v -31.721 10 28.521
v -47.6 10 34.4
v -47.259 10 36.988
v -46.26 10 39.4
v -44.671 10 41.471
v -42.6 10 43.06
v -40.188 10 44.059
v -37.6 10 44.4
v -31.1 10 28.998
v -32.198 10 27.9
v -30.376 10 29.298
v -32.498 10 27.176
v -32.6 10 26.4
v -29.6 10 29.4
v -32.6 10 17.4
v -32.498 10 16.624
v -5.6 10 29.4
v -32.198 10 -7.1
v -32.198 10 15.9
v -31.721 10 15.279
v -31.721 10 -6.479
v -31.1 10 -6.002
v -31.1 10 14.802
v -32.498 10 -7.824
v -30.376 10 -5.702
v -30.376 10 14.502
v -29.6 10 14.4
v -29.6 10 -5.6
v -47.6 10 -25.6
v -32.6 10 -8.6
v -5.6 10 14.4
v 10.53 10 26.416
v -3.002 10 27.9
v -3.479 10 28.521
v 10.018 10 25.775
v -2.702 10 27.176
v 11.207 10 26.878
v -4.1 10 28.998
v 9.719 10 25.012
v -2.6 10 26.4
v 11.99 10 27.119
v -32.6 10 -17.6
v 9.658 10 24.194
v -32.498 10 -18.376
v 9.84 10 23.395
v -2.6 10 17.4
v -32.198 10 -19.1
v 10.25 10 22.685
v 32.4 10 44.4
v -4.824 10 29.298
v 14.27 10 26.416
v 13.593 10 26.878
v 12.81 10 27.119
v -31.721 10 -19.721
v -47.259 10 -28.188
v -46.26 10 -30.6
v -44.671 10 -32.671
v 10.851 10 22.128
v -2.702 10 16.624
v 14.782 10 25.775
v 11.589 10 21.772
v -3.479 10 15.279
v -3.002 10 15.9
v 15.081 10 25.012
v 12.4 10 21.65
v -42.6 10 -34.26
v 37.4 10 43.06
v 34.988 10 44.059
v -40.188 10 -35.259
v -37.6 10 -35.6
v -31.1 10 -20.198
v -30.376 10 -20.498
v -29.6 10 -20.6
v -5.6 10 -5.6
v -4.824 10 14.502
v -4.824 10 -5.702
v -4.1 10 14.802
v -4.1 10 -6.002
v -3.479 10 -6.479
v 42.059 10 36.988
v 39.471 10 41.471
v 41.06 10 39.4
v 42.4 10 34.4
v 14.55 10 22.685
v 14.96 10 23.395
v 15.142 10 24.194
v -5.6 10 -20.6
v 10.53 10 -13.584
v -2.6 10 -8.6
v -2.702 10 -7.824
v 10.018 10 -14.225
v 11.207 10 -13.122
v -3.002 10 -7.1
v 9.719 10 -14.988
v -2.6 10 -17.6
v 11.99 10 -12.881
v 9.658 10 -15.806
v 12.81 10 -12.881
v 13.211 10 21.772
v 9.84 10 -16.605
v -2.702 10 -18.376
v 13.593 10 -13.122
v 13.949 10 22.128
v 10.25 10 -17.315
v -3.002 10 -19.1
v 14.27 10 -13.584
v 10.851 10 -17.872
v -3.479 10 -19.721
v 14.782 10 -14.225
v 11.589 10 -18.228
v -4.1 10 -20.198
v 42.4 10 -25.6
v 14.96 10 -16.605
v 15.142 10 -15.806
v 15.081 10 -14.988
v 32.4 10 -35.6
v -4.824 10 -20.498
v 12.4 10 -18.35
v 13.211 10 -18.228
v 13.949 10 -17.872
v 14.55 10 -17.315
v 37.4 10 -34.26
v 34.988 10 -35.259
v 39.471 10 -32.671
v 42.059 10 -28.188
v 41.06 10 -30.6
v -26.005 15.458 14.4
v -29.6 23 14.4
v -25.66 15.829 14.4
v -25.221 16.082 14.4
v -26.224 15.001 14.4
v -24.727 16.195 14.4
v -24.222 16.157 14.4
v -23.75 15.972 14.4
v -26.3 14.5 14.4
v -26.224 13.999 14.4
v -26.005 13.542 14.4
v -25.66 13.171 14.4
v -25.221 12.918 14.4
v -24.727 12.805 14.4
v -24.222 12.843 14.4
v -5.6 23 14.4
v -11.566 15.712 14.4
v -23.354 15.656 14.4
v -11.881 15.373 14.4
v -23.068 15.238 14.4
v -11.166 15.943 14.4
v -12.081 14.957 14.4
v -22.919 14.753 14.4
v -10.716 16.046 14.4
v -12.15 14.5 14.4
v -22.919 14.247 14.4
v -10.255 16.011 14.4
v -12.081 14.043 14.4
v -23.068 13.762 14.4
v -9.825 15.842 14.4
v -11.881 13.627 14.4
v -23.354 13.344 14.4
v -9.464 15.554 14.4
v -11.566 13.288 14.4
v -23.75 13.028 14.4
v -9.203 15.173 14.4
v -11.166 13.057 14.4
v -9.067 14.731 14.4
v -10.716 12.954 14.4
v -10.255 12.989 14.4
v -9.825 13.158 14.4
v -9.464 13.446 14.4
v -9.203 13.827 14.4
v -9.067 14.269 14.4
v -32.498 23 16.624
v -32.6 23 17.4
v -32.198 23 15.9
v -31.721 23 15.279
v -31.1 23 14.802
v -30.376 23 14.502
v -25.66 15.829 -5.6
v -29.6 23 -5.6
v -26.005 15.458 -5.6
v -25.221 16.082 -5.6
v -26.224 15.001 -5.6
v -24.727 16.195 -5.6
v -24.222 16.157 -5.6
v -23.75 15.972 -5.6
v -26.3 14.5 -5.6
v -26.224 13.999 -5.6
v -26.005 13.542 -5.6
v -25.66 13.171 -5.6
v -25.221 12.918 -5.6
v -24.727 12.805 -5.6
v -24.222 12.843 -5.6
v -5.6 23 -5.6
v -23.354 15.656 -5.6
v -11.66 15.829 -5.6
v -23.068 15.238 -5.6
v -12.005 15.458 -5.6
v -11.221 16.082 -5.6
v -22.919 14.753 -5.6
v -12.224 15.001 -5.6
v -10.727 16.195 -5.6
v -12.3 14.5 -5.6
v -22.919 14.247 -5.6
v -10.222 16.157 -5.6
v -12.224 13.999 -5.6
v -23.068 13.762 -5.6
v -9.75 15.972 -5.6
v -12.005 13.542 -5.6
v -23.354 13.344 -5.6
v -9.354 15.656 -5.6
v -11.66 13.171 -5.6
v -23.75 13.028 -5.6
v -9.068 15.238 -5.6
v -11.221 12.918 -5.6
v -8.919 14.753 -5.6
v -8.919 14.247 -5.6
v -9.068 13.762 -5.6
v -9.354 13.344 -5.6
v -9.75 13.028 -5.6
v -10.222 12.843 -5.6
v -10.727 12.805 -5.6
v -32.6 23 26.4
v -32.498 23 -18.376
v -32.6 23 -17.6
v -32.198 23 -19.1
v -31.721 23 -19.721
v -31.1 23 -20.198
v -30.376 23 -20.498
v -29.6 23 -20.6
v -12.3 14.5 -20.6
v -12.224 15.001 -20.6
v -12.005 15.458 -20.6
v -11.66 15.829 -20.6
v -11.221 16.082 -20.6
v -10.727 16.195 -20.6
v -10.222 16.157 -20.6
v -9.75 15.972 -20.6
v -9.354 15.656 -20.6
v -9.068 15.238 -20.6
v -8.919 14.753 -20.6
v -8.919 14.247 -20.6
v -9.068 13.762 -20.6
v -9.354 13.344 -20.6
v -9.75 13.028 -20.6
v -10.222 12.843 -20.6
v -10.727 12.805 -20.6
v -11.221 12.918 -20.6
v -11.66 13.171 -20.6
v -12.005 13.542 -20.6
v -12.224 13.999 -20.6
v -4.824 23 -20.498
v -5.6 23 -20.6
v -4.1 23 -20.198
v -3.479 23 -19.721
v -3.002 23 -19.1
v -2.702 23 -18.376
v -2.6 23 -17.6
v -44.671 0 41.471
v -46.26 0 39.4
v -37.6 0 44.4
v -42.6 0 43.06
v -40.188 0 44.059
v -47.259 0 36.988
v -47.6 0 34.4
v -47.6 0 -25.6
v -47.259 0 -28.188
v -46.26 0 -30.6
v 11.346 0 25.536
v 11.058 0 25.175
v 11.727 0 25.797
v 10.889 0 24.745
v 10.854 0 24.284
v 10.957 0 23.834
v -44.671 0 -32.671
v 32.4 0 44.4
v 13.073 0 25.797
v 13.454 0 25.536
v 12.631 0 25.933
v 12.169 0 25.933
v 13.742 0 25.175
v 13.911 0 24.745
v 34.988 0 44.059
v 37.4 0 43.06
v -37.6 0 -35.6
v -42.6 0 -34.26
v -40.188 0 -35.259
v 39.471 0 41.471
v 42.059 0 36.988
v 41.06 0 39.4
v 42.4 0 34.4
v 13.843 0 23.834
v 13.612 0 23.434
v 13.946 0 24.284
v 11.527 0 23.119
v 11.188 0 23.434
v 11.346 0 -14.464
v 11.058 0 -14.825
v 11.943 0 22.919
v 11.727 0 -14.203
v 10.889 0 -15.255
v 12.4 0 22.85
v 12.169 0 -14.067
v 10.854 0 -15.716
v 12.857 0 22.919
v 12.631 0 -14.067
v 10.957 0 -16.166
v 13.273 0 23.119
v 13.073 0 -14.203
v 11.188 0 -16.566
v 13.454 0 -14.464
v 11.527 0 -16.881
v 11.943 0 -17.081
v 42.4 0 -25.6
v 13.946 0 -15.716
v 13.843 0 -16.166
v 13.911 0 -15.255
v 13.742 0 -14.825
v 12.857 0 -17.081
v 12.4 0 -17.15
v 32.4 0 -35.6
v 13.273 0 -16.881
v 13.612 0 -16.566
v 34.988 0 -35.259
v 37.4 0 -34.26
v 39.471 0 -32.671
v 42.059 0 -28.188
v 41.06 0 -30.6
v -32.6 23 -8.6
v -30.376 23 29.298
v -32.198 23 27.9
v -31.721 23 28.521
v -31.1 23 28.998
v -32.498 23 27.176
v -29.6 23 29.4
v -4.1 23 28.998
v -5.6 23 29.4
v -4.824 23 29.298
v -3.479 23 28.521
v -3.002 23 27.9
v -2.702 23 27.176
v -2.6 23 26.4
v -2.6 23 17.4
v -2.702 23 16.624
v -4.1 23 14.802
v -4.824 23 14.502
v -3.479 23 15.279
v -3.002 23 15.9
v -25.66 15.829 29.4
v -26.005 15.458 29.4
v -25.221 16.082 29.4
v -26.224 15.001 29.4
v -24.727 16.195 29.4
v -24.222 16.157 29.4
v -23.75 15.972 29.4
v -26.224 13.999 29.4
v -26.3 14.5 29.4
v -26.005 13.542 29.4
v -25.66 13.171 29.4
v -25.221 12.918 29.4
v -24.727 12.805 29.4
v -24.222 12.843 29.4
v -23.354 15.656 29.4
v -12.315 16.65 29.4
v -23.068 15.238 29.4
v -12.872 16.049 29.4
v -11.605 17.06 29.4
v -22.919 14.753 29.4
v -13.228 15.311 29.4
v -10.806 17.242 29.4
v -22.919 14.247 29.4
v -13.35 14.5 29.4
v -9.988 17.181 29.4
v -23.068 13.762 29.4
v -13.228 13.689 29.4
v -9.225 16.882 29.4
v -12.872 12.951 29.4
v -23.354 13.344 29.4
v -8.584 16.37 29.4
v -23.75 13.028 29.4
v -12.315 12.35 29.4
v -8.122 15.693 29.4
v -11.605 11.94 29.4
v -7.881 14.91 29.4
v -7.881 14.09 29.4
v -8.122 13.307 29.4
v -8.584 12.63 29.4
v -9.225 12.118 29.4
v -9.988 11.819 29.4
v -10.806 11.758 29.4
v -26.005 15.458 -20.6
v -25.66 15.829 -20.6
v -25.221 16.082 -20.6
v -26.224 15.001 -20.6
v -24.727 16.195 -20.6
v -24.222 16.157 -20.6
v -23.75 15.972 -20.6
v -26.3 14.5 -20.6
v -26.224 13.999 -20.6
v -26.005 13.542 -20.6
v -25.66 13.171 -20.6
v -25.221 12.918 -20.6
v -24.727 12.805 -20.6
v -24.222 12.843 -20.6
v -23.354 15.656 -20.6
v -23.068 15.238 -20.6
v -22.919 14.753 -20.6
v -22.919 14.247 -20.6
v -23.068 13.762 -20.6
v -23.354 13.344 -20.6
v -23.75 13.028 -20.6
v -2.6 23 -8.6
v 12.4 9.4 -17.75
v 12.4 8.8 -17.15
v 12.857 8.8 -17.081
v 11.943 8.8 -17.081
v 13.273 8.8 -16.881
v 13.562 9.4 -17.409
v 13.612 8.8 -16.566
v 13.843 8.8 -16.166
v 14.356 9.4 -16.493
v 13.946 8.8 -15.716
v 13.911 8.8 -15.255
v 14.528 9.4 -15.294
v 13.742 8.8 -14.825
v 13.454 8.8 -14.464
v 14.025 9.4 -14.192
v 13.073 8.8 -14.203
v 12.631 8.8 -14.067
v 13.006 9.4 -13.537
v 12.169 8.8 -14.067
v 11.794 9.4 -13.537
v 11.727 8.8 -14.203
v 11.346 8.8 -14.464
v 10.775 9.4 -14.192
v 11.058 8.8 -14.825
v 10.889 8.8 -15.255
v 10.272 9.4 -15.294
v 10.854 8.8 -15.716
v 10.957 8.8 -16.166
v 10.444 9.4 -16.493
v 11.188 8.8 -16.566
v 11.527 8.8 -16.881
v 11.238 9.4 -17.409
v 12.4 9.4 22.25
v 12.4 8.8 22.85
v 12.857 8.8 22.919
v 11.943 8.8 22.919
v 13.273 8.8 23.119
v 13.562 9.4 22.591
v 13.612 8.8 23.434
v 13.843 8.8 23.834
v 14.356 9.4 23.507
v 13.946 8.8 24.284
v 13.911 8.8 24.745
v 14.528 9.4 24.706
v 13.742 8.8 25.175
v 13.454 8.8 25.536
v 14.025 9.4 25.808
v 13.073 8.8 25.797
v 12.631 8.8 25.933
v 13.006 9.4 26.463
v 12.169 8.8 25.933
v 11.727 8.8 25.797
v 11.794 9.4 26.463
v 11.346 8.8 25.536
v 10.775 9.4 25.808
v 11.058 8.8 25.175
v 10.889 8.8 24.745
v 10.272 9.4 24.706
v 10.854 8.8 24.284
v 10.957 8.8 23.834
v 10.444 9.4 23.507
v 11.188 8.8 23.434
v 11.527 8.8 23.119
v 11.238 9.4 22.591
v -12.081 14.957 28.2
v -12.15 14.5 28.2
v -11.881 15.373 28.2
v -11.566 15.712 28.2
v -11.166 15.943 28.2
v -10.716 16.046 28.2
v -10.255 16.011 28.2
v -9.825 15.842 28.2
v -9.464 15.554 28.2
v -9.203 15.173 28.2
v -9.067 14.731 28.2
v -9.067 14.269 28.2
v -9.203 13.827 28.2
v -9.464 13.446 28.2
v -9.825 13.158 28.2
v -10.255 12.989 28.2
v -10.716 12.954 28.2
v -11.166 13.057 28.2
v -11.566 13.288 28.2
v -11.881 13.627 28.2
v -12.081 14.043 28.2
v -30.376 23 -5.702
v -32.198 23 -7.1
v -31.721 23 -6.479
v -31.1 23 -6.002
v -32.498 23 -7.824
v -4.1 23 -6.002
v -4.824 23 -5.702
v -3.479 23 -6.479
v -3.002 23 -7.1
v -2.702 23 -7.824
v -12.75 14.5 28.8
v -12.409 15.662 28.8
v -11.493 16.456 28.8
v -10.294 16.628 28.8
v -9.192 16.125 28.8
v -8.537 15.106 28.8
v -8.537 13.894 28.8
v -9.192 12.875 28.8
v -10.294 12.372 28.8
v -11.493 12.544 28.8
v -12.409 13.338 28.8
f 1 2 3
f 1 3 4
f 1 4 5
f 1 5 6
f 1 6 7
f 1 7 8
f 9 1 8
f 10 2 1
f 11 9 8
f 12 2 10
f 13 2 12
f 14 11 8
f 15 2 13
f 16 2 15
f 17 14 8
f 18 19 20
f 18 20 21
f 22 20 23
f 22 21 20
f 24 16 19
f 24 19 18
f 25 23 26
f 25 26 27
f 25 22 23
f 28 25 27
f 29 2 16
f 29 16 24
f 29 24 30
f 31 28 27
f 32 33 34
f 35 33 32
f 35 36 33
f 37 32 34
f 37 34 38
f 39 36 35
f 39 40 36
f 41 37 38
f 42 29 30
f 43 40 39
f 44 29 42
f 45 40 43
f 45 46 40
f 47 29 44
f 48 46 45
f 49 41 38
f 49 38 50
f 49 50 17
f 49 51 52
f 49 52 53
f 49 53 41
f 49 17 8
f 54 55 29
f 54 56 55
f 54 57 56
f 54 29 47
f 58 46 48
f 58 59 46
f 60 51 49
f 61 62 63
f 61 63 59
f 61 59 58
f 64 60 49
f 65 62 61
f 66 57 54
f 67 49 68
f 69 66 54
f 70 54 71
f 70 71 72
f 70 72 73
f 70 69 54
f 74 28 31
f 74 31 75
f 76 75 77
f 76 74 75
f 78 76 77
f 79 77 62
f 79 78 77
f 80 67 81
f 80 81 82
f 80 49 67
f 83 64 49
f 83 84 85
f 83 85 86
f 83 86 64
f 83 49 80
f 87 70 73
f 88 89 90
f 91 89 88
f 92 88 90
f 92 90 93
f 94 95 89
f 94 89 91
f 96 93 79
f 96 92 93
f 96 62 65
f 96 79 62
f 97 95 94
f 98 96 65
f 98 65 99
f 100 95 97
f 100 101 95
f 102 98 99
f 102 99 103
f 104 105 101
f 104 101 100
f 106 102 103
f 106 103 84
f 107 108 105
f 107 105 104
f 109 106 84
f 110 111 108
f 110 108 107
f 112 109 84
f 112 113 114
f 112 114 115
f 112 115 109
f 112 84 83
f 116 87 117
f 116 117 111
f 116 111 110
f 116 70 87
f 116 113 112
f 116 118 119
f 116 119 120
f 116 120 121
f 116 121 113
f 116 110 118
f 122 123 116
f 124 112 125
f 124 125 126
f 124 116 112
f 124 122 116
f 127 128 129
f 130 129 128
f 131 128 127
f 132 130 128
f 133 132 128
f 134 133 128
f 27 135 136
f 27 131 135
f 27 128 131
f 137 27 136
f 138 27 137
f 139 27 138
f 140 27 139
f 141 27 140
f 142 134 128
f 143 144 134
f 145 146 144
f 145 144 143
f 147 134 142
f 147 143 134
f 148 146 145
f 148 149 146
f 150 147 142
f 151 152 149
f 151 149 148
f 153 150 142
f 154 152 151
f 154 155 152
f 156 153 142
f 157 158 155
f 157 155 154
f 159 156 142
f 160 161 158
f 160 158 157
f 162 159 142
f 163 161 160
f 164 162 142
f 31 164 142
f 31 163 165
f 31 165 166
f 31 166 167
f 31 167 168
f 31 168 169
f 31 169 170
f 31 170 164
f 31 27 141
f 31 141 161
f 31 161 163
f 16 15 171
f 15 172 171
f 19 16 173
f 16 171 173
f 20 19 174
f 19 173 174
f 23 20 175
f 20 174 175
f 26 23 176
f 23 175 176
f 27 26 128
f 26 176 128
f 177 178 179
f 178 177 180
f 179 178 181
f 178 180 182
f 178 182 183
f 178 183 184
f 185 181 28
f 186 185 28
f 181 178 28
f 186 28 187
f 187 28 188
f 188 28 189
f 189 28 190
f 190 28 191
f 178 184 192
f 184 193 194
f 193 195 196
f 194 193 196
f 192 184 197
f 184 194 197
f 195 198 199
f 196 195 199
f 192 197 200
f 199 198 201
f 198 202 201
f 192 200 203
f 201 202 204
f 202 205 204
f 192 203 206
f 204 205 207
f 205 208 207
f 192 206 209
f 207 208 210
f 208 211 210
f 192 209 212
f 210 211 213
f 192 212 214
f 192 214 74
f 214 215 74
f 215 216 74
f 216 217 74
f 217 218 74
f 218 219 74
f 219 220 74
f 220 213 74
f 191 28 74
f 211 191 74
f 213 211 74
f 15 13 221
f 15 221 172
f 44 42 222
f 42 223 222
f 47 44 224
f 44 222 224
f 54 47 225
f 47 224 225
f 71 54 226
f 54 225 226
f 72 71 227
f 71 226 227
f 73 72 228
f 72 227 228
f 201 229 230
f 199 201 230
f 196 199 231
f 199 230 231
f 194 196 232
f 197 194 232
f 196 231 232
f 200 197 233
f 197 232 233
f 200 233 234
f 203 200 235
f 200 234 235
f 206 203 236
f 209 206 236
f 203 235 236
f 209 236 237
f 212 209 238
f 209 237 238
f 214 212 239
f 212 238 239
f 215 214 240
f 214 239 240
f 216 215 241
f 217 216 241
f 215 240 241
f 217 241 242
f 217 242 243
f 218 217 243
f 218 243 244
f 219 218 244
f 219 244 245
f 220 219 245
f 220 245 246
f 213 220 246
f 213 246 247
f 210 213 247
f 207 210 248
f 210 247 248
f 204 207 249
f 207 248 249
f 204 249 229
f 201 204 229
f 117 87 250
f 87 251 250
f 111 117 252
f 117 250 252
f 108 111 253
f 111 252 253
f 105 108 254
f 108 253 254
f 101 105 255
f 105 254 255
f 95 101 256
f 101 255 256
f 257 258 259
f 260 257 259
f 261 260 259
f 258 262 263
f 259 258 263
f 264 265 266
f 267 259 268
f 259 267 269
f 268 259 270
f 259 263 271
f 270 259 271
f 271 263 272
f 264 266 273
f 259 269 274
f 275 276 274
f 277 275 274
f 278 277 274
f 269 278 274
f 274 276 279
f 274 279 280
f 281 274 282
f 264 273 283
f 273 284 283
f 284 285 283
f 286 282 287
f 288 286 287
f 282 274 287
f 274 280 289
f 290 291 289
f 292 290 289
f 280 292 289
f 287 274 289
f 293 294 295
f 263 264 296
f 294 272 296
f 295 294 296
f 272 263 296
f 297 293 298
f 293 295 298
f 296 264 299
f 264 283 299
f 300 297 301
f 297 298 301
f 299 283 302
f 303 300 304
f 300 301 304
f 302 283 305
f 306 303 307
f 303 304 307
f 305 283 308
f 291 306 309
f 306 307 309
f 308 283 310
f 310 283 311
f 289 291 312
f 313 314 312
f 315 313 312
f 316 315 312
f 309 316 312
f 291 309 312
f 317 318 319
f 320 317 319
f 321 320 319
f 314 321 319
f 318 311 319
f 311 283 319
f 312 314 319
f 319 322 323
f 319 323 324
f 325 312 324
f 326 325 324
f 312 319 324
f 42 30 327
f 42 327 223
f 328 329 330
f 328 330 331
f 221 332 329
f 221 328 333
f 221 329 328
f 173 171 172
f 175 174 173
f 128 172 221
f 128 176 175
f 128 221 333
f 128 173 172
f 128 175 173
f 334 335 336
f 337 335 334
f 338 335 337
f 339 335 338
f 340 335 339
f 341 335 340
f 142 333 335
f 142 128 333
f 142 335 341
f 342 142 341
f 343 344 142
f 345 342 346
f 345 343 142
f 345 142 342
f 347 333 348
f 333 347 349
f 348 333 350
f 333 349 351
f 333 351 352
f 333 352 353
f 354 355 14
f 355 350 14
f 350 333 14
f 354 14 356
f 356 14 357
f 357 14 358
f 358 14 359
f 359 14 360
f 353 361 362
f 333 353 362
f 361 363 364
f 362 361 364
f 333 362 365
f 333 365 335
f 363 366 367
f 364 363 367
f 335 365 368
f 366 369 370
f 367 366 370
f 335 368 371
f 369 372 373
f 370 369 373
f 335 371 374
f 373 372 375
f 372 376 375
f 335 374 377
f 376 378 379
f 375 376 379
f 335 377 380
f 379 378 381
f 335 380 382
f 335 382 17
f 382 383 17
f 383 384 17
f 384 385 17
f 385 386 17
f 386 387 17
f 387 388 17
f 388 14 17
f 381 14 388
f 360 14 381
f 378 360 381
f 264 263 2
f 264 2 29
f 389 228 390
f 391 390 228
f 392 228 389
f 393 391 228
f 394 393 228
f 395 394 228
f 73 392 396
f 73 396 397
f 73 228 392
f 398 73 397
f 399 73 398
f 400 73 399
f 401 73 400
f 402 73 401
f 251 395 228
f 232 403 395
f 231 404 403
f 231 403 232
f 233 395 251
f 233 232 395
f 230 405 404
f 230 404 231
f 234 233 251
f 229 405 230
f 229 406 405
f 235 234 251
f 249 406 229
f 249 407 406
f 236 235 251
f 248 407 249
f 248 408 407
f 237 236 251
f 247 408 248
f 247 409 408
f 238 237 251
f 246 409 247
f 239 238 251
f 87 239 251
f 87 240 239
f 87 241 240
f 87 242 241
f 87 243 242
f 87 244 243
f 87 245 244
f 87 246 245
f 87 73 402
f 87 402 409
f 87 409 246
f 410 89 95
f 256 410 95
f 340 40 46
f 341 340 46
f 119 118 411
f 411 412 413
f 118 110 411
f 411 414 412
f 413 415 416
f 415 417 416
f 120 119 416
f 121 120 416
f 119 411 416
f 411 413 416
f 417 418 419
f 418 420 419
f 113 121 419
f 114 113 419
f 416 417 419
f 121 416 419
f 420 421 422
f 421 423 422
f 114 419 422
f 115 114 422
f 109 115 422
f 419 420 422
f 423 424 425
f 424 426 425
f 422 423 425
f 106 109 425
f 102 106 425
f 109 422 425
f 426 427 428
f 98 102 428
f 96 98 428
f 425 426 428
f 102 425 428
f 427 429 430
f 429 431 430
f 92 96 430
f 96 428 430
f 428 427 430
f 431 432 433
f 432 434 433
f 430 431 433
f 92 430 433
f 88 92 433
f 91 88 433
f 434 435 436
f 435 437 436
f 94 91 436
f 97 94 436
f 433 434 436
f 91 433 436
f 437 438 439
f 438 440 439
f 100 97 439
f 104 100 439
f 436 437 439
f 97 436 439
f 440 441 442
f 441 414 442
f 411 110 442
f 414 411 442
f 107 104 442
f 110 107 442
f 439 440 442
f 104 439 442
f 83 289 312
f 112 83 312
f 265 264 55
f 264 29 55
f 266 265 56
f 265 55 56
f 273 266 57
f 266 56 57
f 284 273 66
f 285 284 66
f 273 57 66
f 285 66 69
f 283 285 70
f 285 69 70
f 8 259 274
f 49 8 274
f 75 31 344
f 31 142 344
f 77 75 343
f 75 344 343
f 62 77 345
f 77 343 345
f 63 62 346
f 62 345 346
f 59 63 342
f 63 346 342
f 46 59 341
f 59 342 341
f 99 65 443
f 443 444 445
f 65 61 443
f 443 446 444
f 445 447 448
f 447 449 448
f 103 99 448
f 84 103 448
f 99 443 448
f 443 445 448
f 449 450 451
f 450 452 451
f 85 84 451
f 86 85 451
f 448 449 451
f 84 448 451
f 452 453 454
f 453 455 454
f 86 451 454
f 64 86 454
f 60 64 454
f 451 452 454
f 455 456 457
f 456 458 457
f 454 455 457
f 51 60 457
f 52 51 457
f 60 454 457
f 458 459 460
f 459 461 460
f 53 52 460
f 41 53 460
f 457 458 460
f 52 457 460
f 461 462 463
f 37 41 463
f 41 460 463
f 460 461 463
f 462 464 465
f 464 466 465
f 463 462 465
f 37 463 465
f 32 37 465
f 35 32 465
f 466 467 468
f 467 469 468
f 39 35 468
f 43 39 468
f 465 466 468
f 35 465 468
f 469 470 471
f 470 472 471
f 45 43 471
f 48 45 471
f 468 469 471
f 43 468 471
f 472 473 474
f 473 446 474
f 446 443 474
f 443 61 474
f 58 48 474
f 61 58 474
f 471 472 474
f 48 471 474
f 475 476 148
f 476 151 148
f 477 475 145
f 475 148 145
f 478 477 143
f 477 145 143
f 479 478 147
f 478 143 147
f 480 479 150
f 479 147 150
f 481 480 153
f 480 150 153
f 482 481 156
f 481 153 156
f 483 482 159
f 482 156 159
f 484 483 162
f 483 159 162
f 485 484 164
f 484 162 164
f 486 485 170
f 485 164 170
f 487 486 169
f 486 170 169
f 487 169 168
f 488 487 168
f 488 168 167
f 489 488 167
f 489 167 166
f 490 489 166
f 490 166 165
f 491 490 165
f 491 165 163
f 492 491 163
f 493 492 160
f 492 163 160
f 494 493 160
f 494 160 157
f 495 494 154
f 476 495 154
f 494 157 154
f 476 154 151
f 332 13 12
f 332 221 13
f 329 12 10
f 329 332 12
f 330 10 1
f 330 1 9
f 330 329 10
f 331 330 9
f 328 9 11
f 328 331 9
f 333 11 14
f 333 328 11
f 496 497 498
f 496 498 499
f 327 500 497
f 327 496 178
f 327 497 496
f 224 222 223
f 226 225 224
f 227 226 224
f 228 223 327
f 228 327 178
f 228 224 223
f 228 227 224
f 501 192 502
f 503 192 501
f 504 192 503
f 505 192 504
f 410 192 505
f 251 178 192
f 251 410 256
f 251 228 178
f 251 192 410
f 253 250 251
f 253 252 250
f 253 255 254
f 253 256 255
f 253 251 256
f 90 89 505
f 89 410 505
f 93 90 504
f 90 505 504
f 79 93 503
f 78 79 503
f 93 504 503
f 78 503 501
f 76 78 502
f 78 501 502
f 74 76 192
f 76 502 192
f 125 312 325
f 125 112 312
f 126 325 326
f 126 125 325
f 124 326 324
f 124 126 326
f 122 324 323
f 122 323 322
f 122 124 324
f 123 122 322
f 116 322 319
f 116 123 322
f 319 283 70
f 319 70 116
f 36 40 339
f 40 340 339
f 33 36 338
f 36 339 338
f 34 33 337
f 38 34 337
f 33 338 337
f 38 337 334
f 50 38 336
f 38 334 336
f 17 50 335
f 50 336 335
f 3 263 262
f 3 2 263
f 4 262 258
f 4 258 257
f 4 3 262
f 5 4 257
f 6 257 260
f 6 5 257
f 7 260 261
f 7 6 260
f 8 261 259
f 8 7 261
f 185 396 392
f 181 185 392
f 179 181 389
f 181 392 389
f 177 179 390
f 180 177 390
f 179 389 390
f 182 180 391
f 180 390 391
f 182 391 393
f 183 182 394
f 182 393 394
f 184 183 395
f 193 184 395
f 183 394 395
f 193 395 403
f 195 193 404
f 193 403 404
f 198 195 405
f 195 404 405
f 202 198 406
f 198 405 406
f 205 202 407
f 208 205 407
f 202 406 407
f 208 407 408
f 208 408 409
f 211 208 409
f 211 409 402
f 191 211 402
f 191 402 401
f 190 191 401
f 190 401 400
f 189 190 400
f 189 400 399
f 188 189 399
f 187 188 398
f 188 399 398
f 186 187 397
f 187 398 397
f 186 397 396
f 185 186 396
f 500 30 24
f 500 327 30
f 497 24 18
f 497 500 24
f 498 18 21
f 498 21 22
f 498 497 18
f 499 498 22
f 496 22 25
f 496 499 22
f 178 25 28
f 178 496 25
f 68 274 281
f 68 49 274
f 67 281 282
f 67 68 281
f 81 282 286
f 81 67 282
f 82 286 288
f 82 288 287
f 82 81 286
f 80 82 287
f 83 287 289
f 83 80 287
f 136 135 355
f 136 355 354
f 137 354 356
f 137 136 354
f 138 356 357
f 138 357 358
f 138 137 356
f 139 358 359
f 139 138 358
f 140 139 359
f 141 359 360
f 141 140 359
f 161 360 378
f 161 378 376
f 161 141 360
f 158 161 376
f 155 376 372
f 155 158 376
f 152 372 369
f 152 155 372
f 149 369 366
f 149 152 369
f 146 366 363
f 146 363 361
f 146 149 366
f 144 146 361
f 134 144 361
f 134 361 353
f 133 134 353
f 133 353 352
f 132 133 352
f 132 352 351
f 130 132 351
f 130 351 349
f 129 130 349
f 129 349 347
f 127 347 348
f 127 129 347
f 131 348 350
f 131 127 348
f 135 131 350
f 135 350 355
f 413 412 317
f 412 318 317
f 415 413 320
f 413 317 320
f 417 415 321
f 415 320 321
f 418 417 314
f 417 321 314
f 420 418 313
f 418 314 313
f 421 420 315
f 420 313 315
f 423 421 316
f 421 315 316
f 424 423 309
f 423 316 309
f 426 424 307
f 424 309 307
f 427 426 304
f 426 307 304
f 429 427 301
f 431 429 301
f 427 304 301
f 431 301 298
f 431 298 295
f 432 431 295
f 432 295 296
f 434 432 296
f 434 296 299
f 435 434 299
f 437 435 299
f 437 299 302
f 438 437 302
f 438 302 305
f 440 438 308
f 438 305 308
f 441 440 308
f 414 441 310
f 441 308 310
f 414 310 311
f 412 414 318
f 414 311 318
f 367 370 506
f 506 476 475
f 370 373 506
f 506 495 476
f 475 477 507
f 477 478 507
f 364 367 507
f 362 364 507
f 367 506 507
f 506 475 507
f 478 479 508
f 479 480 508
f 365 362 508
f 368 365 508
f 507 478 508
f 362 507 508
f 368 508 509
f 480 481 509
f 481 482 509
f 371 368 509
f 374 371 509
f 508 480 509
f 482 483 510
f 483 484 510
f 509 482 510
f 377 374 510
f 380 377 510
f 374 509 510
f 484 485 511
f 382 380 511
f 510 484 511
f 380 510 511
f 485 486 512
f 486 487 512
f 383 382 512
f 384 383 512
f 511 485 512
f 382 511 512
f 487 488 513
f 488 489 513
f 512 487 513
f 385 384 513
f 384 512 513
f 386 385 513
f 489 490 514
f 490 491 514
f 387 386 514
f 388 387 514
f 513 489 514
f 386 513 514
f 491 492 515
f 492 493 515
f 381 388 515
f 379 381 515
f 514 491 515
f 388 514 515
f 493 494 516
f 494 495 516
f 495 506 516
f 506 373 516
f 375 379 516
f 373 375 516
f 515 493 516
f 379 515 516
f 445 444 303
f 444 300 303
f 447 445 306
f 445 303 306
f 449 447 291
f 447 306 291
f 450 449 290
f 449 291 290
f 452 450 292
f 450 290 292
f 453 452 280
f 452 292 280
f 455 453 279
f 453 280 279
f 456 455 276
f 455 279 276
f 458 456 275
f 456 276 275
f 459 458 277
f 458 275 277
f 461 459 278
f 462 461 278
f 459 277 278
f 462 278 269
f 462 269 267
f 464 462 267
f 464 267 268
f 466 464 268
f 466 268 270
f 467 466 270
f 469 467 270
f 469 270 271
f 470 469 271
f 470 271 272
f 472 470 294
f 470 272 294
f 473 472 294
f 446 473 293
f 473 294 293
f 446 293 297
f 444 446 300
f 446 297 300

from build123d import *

# Parameters (mm, degrees)
SCHIZZO1_W                               = 90
SCHIZZO1_H                               = 80
ESTRUSIONE_ESTRUSIONE1_DEPTH             = 10
RACCORDO1_R                              = 10
FORO_SVASATO_PER_VITE_M2_5_1_D           = 3.1
FORO_SVASATO_PER_VITE_M2_5_1_CSINK_D     = 5.5
FORO_SVASATO_PER_VITE_M2_5_1_CSINK_ANGLE = 90
SCHIZZO4_W                               = 30
SCHIZZO4_H                               = 15
ESTRUSIONE_ESTRUSIONE2_DEPTH             = 13
FORO_SVASATO_PER_VITE_M2_5_2_D           = 3.1
FORO_SVASATO_PER_VITE_M2_5_2_DEPTH       = 15
FORO_SVASATO_PER_VITE_M2_5_2_CSINK_D     = 5.5
FORO_SVASATO_PER_VITE_M2_5_2_CSINK_ANGLE = 90
FORO_SVASATO_PER_VITE_M2_5_2_TIP         = 0.931333959
RACCORDO2_R                              = 3
SCHIZZO5_R                               = 1.7
TAGLIO_ESTRUSIONE4_DEPTH                 = 15
TAGLIO_ESTRUSIONE5_START                 = -15
SCHIZZO6_R                               = 1.7
TAGLIO_ESTRUSIONE5_DEPTH                 = 15


with BuildPart() as part:
    # Schizzo1 → Estrusione-Estrusione1 (new body)
    with BuildSketch(Plane(origin=(0, 0, 0), x_dir=(1, 0, 0), z_dir=(0, 1, 0))):
        with Locations((-2.6, -4.4)):
            Rectangle(SCHIZZO1_W, SCHIZZO1_H)
    extrude(amount=ESTRUSIONE_ESTRUSIONE1_DEPTH)

    # Raccordo1
    raccordo1_edges = [part.edges().sort_by_distance(p)[0] for p in [
        (42.4, 5, -35.6),
        (42.4, 5, 44.4),
        (-47.6, 5, 44.4),
        (-47.6, 5, -35.6),
    ]]
    fillet(raccordo1_edges, radius=RACCORDO1_R)

    # Foro svasato per Vite M2.5-1 (through all)
    with Locations(Plane(origin=(12.4, 10, -15.6), x_dir=(0, 0, 1), z_dir=(0, 1, 0))):
        with Locations((0, 0), (40, 0)):
            CounterSinkHole(FORO_SVASATO_PER_VITE_M2_5_1_D / 2, FORO_SVASATO_PER_VITE_M2_5_1_CSINK_D / 2, counter_sink_angle=FORO_SVASATO_PER_VITE_M2_5_1_CSINK_ANGLE)

    # Schizzo4 → Estrusione-Estrusione2 (add)
    with BuildSketch(Plane(origin=(0, 10, 0), x_dir=(1, 0, 0), z_dir=(0, 1, 0))):
        with Locations((-17.6, 13.1)):
            Rectangle(SCHIZZO4_W, SCHIZZO4_H)
        with Locations((-17.6, -21.9)):
            Rectangle(SCHIZZO4_W, SCHIZZO4_H)
    extrude(amount=ESTRUSIONE_ESTRUSIONE2_DEPTH)

    # Foro svasato per Vite M2.5-2
    with Locations(Plane(origin=(-10.6, 14.5, 29.4), x_dir=(1, 0, 0), z_dir=(0, 0, 1))):
        with Locations((0, 0)):
            CounterSinkHole(FORO_SVASATO_PER_VITE_M2_5_2_D / 2, FORO_SVASATO_PER_VITE_M2_5_2_CSINK_D / 2, depth=FORO_SVASATO_PER_VITE_M2_5_2_DEPTH, counter_sink_angle=FORO_SVASATO_PER_VITE_M2_5_2_CSINK_ANGLE)
            with Locations((0, 0, -(FORO_SVASATO_PER_VITE_M2_5_2_DEPTH + FORO_SVASATO_PER_VITE_M2_5_2_TIP / 2))):  # 118° drill point
                Cone(0, FORO_SVASATO_PER_VITE_M2_5_2_D / 2, FORO_SVASATO_PER_VITE_M2_5_2_TIP, mode=Mode.SUBTRACT)

    # Raccordo2
    raccordo2_edges = [part.edges().sort_by_distance(p)[0] for p in [
        (-2.6, 16.5, -20.6),
        (-32.6, 16.5, -20.6),
        (-32.6, 16.5, -5.6),
        (-2.6, 16.5, -5.6),
        (-2.6, 16.5, 14.4),
        (-32.6, 16.5, 14.4),
        (-32.6, 16.5, 29.4),
        (-2.6, 16.5, 29.4),
    ]]
    fillet(raccordo2_edges, radius=RACCORDO2_R)

    # Schizzo5 → Taglio-Estrusione4 (cut)
    with BuildSketch(Plane(origin=(0, 0, -20.6), x_dir=(-1, 0, 0), z_dir=(0, 0, -1))):
        with Locations((10.6, 14.5)):
            Circle(SCHIZZO5_R)
        with Locations((24.6, 14.5)):
            Circle(SCHIZZO5_R)
    extrude(amount=-TAGLIO_ESTRUSIONE4_DEPTH, mode=Mode.SUBTRACT)

    # Schizzo6 → Taglio-Estrusione5 (cut)
    with BuildSketch(Plane.XY.offset(29.4).offset(TAGLIO_ESTRUSIONE5_START)):
        with Locations(Location((-24.6, 14.5, 0), (0, 0, 180))):
            Circle(SCHIZZO6_R)
    extrude(amount=TAGLIO_ESTRUSIONE5_DEPTH, mode=Mode.SUBTRACT)


solid = part.part
